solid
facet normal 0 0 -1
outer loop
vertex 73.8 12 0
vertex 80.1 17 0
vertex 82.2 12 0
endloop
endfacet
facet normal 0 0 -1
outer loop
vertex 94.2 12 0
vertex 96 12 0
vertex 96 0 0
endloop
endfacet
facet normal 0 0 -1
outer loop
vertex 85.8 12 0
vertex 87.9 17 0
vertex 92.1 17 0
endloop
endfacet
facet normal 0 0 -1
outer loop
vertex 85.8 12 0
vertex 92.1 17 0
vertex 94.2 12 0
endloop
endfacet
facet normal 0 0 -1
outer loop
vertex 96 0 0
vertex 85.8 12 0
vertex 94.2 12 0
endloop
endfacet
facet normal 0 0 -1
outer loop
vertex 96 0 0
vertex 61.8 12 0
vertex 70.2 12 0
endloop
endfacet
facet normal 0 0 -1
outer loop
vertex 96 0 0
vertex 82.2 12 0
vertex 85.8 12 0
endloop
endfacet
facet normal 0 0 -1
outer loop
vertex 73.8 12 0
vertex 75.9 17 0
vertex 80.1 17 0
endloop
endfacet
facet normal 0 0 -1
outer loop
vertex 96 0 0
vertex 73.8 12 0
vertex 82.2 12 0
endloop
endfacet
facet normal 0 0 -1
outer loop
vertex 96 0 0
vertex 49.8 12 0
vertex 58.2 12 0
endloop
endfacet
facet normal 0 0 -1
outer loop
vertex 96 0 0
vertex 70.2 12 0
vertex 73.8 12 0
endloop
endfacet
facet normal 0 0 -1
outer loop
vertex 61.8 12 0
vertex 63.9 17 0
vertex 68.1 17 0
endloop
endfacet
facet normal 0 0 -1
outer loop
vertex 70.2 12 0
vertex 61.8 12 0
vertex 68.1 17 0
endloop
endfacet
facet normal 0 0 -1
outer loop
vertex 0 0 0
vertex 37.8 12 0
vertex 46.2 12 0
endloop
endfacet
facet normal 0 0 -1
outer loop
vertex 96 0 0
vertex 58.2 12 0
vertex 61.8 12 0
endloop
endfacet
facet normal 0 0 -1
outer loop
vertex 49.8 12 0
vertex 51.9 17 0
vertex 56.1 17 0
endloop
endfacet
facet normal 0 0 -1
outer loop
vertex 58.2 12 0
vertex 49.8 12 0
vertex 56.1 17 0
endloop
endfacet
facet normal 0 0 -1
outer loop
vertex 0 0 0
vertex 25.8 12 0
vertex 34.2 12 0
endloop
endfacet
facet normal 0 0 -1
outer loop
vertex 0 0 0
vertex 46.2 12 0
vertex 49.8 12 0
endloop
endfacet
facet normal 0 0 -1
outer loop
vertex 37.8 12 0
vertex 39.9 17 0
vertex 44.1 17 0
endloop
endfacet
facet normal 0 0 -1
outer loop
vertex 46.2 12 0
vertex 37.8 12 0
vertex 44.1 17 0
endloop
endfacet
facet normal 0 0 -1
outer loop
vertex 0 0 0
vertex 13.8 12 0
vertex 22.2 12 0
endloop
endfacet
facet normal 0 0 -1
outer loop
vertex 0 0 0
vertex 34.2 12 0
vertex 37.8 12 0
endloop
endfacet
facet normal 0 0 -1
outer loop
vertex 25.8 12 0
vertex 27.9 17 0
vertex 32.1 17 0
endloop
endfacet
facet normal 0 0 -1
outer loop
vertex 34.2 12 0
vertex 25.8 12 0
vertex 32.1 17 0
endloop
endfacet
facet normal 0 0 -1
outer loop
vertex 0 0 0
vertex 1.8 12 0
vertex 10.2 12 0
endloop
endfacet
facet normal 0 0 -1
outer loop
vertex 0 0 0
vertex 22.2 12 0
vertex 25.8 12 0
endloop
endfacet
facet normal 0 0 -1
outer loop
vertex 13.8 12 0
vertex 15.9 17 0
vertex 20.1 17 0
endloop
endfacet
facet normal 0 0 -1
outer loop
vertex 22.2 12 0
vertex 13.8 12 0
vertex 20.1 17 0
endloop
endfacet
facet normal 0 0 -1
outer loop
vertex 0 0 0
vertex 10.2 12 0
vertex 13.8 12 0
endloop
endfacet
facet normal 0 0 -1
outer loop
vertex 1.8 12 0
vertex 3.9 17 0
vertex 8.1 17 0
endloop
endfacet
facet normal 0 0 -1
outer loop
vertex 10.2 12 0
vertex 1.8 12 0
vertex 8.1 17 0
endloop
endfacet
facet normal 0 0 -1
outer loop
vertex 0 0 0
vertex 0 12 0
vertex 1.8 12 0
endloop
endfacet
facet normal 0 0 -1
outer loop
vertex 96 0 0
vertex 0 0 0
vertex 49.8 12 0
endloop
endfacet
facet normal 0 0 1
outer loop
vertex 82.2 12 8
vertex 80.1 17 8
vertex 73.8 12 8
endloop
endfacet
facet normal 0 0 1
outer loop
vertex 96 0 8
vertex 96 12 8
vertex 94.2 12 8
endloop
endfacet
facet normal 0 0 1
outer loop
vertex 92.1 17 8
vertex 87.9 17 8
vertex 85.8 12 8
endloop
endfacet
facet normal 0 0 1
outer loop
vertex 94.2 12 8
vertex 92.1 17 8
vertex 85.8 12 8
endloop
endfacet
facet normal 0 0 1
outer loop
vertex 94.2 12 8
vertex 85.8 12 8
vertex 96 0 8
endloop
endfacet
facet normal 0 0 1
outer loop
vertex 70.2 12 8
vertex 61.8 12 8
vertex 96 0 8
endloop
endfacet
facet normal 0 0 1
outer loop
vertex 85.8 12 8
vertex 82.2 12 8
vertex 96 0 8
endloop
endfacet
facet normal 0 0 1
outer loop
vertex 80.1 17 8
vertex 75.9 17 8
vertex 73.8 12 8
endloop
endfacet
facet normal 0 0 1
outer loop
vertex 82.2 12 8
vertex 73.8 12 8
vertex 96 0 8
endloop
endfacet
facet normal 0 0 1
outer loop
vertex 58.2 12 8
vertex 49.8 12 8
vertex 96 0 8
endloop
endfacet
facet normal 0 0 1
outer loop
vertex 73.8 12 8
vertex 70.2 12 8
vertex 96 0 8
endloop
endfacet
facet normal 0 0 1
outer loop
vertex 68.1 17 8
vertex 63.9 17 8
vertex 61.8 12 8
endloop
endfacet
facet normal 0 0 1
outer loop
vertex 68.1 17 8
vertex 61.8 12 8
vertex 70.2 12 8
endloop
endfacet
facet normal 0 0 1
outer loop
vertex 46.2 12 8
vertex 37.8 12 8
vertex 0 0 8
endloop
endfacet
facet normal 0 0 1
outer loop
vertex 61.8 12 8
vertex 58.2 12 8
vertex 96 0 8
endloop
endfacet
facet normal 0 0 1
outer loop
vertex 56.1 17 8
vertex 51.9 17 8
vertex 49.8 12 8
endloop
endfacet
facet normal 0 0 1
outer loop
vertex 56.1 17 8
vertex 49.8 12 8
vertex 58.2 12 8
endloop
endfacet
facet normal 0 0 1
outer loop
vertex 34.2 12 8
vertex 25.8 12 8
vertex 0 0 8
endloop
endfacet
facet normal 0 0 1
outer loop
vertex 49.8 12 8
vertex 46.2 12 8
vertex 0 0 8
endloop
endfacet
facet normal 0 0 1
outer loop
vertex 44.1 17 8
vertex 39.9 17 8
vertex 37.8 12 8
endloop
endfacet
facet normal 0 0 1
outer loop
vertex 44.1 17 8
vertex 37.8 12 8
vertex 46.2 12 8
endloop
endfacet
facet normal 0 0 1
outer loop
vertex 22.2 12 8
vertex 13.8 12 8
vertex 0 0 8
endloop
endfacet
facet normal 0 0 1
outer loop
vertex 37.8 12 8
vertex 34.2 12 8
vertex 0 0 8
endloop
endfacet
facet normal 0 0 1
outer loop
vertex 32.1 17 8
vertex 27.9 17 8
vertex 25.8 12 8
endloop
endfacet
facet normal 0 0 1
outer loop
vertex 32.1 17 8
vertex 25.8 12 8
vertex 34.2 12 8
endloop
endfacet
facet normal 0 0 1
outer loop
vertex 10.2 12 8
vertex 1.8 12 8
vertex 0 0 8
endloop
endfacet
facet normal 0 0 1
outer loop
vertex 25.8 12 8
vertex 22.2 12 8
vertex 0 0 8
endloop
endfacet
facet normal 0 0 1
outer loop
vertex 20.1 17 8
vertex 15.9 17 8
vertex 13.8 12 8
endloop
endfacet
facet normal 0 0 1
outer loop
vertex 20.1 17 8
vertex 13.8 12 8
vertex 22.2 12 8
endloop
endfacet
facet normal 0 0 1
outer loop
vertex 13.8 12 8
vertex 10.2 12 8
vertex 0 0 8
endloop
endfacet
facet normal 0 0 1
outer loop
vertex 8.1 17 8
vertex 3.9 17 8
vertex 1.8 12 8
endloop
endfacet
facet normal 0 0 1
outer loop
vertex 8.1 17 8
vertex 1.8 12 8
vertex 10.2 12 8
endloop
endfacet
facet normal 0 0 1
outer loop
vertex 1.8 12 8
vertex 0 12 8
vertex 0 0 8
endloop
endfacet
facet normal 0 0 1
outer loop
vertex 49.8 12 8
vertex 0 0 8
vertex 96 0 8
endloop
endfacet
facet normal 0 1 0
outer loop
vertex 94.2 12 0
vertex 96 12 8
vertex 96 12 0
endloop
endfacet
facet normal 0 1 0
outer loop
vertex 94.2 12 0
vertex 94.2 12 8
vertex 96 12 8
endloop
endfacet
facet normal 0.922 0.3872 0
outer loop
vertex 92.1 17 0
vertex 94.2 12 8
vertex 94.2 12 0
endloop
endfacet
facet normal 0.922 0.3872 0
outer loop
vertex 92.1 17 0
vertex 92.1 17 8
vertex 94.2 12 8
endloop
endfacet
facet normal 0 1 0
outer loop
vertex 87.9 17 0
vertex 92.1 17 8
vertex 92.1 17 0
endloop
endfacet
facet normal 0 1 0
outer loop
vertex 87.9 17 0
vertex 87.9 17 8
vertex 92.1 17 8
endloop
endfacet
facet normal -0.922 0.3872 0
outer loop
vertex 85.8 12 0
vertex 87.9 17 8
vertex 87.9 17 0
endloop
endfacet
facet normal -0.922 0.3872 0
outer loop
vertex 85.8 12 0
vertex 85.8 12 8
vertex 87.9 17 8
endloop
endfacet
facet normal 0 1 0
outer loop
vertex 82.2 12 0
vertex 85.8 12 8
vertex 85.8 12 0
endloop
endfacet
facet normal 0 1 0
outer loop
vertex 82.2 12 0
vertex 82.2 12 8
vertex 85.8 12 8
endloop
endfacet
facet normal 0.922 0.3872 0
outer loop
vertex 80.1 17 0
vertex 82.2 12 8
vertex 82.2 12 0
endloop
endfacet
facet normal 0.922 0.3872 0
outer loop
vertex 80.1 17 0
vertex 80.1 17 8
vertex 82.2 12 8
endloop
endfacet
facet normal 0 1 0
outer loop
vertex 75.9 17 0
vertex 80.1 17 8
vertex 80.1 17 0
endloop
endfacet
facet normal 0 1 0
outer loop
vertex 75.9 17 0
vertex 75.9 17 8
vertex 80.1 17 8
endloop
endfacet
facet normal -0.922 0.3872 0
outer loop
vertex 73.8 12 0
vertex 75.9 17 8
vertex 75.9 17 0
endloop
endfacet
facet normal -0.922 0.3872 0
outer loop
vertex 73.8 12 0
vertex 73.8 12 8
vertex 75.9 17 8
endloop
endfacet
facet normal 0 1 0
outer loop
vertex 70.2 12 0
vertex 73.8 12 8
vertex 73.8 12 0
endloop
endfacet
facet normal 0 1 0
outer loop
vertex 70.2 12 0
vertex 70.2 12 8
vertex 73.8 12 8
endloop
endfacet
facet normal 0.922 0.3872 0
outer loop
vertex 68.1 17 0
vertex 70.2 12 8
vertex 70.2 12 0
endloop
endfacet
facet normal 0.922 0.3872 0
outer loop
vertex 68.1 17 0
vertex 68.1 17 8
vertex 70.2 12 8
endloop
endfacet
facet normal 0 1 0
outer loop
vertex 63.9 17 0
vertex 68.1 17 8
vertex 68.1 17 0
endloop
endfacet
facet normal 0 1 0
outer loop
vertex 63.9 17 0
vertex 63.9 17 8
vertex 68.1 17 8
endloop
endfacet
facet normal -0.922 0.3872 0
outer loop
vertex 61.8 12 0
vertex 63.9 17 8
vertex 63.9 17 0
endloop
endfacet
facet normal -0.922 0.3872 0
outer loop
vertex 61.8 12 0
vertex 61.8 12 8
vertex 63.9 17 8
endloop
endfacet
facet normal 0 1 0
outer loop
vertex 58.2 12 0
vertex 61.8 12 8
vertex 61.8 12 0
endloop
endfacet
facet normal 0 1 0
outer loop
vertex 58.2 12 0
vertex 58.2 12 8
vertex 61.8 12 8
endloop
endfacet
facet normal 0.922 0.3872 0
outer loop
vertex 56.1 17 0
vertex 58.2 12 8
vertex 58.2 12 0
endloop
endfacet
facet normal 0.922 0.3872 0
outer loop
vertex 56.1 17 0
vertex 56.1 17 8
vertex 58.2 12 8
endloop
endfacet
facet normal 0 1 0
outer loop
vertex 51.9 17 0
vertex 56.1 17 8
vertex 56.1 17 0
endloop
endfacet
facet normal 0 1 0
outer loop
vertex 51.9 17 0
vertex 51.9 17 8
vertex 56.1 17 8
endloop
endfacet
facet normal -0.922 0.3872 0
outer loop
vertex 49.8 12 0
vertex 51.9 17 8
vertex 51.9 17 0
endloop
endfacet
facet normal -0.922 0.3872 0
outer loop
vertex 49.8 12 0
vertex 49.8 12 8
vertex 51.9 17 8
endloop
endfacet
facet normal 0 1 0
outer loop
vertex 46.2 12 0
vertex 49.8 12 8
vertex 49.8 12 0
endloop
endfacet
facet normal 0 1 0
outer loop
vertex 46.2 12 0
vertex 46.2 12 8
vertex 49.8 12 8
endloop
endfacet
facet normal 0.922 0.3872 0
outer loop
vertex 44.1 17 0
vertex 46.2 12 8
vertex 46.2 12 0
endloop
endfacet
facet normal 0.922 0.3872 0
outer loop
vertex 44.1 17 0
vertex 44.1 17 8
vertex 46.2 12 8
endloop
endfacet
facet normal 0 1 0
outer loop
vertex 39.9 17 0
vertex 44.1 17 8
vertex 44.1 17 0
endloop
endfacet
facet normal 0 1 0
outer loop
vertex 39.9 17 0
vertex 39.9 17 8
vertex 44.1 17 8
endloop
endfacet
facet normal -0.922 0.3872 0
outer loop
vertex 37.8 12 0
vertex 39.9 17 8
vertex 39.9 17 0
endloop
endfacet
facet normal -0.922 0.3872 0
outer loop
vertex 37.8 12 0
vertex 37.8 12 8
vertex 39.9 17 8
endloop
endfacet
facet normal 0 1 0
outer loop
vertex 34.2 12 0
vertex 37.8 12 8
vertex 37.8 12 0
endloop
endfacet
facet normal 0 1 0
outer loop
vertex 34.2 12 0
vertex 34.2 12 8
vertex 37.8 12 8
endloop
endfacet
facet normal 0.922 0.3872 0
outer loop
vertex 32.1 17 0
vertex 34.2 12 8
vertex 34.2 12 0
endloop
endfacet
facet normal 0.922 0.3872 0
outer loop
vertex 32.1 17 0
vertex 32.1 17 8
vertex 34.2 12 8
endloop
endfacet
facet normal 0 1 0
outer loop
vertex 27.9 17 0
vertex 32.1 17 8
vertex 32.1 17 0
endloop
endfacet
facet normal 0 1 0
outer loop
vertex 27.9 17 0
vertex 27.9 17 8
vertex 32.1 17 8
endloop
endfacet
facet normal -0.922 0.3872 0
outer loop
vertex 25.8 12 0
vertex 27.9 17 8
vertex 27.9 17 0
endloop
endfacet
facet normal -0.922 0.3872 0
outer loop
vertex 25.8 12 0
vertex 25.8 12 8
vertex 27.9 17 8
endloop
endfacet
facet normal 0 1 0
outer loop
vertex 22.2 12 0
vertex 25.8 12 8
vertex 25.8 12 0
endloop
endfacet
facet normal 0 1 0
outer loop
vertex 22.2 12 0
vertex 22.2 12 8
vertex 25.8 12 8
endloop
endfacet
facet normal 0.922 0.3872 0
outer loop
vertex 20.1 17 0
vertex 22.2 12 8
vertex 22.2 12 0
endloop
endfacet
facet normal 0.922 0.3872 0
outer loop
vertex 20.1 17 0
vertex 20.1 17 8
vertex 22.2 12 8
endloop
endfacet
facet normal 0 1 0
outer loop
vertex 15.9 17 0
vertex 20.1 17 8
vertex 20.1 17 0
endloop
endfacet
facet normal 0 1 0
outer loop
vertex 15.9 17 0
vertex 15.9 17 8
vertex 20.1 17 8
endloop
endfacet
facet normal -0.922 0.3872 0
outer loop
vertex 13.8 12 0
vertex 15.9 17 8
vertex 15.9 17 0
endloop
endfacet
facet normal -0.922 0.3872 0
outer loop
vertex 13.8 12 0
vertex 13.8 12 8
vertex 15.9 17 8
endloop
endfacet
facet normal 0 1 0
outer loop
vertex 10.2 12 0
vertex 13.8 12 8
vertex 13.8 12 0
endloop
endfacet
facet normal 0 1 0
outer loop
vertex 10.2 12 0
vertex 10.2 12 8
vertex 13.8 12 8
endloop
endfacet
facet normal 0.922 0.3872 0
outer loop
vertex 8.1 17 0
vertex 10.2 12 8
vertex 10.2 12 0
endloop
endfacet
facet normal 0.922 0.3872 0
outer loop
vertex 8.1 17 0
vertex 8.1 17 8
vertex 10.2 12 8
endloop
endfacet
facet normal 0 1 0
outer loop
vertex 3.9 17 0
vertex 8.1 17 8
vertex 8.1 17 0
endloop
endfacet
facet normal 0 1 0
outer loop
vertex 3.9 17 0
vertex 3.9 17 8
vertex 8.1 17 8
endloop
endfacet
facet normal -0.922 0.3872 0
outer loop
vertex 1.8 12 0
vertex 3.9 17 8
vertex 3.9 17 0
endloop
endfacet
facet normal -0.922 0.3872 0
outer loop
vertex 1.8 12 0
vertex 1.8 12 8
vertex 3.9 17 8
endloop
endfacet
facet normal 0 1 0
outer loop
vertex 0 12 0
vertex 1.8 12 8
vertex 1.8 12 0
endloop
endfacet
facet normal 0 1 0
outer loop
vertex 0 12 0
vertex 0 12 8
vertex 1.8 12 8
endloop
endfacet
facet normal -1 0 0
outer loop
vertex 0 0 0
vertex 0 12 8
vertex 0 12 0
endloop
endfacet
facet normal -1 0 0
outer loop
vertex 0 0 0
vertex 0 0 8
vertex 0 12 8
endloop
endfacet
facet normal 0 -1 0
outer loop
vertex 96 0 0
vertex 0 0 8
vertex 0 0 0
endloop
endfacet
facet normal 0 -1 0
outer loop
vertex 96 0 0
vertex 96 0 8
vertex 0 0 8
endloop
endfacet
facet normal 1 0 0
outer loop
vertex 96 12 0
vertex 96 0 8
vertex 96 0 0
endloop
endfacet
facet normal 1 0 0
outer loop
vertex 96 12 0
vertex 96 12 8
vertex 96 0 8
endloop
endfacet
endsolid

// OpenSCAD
$fn = 32;

// ----------------------------------------------------------------------
// Gear rack: 8 teeth, pitch 12 mm
// ----------------------------------------------------------------------

// --- parameters (mm) ---
teeth = 8;                // number of teeth
pitch = 12;               // tooth pitch, X
root_w = 8.4;             // tooth width at the root
tip_w = 4.2;              // tooth width at the tip
base_h = 12;              // rack body height, Y
tooth_h = 5;              // tooth height above the body
plate_t = 8;              // rack width, Z (extrusion height)

rack_l = teeth * pitch;  // overall length
total_h = base_h + tooth_h;  // overall height

profile = [[0, 0], [96, 0], [96, 12], [94.2, 12], [92.1, 17], [87.9, 17], [85.8, 12], [82.2, 12], [80.1, 17], [75.9, 17], [73.8, 12], [70.2, 12], [68.1, 17], [63.9, 17], [61.8, 12], [58.2, 12], [56.1, 17], [51.9, 17], [49.8, 12], [46.2, 12], [44.1, 17], [39.9, 17], [37.8, 12], [34.2, 12], [32.1, 17], [27.9, 17], [25.8, 12], [22.2, 12], [20.1, 17], [15.9, 17], [13.8, 12], [10.2, 12], [8.1, 17], [3.9, 17], [1.8, 12], [0, 12]];  // primary outline, 36 points, counter clockwise

// --- the one profile operation ---
linear_extrude(height = plate_t) polygon(points = profile);
